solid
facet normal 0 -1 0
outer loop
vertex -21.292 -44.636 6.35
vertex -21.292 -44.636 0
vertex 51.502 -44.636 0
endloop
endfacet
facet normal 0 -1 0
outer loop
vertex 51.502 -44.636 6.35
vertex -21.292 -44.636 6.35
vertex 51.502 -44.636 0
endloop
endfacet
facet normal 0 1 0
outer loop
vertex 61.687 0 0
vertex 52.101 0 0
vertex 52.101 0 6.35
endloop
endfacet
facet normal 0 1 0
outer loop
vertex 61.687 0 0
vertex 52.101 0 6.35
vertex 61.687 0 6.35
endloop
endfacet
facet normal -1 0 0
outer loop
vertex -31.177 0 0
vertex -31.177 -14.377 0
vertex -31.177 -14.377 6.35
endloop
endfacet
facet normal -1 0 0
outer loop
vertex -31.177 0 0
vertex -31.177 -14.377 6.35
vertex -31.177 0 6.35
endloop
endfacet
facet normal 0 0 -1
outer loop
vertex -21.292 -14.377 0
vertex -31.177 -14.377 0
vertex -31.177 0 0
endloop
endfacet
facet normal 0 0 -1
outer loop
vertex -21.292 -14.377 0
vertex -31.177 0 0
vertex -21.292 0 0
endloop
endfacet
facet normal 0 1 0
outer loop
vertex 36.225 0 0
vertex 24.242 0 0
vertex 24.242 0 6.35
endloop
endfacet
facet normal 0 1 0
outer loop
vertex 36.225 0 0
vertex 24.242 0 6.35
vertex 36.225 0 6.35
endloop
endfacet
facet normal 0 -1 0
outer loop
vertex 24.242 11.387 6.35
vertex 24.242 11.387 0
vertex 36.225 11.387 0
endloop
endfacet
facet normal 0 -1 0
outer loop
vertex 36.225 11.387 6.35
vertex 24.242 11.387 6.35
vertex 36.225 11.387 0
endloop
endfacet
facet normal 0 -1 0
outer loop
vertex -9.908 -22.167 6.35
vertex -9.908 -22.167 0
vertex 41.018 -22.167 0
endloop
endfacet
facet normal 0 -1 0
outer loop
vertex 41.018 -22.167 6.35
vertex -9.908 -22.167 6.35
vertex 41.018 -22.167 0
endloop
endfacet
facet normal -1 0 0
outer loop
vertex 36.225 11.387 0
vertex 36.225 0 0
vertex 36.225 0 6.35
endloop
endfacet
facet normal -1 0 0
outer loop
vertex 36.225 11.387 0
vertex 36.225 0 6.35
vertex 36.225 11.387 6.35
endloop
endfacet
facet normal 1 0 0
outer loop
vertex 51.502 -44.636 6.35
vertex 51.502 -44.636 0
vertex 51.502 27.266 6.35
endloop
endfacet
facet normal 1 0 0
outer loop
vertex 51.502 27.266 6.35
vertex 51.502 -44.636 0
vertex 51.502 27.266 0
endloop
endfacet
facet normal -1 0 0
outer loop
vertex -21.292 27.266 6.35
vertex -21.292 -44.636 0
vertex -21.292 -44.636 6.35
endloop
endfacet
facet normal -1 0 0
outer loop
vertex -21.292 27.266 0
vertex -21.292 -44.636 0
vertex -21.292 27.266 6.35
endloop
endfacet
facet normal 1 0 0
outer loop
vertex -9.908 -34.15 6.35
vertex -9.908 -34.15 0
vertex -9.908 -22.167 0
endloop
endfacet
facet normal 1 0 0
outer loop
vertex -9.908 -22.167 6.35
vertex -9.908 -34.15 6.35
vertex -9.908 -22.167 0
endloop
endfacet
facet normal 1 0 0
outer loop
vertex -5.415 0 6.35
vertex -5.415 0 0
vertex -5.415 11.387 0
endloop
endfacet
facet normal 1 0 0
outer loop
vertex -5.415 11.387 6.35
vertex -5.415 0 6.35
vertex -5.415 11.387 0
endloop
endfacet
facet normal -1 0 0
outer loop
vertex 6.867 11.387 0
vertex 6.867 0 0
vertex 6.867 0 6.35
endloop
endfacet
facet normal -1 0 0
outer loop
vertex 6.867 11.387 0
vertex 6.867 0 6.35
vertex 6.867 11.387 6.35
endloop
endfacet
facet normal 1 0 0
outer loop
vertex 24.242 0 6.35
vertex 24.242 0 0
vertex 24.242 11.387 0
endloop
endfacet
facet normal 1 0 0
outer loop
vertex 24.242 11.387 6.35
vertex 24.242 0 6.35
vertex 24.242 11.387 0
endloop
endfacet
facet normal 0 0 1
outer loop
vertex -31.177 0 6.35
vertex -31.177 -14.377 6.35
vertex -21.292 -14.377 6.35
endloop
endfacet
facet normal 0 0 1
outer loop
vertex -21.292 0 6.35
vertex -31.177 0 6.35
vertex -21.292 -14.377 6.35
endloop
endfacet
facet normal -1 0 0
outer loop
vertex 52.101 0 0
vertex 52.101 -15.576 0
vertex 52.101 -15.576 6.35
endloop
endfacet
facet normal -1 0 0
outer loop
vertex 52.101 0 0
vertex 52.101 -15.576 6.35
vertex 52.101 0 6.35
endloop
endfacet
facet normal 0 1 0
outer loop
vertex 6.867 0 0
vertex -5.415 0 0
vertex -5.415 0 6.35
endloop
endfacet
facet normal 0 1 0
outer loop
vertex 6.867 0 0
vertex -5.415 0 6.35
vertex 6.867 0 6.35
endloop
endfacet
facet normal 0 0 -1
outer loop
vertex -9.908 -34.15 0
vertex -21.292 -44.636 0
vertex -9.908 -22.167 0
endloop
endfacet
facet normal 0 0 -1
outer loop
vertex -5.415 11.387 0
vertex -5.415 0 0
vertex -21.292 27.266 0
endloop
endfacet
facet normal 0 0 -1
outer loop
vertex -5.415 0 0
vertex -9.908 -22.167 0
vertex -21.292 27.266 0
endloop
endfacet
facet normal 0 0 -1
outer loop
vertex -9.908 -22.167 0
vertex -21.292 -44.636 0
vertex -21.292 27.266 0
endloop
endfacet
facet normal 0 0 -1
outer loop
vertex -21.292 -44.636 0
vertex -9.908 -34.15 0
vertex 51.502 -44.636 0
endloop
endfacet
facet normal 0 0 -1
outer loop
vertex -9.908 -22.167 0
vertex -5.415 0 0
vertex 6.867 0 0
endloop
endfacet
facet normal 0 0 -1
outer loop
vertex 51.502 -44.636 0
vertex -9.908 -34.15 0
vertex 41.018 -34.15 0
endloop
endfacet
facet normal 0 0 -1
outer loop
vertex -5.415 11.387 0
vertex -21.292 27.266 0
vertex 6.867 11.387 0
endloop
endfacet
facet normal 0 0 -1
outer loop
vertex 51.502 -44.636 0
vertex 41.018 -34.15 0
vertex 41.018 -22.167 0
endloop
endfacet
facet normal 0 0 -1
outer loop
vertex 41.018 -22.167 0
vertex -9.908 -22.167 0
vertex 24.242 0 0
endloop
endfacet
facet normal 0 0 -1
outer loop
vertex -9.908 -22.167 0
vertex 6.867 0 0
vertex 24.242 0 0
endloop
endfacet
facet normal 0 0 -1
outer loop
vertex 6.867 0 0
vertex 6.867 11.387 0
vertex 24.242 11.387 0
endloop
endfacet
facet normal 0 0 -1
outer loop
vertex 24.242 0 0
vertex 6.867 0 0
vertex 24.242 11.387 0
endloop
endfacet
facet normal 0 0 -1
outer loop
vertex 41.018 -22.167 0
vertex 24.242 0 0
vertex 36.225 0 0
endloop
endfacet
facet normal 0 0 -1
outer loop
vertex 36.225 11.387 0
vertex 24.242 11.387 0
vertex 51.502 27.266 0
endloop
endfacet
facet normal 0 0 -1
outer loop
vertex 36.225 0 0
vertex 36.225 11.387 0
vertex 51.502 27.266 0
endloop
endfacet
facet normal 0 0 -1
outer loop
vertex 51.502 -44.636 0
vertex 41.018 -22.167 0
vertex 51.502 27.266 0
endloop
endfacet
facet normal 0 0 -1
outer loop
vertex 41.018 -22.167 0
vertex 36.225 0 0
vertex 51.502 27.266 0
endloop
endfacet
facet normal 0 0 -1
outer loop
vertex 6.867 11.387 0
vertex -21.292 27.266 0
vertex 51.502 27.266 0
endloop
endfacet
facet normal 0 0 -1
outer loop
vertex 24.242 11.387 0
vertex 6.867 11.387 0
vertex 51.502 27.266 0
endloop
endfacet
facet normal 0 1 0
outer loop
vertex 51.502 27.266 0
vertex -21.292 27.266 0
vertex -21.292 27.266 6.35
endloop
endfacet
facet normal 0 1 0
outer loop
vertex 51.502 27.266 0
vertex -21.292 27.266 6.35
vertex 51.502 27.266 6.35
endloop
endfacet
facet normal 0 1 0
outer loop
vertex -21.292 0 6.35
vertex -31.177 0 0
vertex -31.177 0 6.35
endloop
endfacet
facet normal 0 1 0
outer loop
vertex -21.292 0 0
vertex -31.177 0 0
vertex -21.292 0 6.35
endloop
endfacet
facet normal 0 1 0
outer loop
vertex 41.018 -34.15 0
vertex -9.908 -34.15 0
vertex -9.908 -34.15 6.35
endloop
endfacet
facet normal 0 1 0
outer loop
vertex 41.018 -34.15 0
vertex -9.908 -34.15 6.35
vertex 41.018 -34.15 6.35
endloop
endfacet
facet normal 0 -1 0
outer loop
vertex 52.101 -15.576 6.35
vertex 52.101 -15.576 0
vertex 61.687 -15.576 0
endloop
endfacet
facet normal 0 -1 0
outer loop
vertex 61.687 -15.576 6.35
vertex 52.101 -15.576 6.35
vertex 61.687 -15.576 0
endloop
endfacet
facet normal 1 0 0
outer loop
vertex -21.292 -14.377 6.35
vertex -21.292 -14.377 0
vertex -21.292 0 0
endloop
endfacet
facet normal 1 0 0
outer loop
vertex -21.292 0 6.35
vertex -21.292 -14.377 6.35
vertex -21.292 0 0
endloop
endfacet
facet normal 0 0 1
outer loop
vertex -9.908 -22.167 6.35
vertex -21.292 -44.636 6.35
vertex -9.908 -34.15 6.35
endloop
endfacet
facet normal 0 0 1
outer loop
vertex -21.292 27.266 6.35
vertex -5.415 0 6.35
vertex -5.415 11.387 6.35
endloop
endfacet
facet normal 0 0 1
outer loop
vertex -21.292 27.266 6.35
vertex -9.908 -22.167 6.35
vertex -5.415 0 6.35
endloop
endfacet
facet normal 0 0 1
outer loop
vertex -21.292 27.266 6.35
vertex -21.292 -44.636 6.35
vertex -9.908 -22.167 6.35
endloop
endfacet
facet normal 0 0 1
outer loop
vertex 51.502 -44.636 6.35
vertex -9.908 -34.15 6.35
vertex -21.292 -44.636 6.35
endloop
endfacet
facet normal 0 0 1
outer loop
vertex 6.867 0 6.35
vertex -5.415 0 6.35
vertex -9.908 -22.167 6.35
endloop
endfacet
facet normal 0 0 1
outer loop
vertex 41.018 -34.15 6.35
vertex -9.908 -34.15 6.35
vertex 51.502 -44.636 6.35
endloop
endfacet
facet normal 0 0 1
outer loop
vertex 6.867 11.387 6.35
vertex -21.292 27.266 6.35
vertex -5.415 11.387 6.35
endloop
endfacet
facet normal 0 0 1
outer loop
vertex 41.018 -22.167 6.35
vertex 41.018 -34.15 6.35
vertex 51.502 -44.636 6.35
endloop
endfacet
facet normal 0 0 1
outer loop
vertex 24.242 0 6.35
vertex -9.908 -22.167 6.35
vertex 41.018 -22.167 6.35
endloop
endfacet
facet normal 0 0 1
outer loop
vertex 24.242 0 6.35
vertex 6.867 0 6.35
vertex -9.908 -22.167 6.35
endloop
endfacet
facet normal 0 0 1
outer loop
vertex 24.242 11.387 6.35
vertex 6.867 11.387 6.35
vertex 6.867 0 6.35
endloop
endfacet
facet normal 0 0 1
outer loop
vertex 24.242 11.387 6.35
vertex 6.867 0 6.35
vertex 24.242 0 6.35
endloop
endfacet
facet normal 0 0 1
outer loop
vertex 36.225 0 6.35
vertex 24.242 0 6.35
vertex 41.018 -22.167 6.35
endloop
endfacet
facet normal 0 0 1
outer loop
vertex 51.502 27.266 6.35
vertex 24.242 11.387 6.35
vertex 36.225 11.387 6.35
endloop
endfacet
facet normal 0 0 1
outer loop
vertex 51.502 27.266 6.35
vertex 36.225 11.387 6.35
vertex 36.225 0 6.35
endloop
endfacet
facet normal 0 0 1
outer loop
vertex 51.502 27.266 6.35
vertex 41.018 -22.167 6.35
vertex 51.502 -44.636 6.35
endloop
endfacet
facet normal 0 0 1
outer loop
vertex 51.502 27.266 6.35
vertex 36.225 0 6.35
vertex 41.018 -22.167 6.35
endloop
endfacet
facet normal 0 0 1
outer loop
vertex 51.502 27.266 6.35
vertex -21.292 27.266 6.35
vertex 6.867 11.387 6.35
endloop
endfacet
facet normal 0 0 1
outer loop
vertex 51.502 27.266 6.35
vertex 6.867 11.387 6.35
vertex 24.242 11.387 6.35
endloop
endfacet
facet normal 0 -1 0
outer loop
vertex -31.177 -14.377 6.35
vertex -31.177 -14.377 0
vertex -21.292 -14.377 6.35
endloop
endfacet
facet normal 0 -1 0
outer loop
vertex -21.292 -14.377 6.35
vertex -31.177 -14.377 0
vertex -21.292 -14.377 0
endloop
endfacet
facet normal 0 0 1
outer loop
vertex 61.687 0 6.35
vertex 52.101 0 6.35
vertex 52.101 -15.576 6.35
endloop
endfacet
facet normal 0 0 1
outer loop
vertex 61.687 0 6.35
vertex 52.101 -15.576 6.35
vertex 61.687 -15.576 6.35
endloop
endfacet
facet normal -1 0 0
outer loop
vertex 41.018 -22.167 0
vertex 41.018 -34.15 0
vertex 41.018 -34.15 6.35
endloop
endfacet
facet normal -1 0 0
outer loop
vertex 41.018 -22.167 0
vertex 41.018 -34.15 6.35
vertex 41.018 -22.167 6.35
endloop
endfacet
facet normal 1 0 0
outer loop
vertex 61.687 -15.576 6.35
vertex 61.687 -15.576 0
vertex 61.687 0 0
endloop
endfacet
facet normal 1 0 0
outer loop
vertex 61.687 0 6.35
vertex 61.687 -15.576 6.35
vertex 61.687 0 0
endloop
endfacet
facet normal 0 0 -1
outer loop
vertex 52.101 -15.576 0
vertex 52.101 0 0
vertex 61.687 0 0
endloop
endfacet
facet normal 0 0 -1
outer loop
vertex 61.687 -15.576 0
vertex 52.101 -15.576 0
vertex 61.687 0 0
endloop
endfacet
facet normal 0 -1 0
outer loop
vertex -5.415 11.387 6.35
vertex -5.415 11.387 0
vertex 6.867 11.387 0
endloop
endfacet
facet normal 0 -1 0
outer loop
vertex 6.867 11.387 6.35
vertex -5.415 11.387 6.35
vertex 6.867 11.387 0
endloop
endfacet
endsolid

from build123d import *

# Parameters (mm, degrees)
F0_W     = 72.793982923
F0_H     = 71.901589632
F5_DEPTH = 6.35
F1_W     = 9.5860436559
F1_H     = 15.57565853
F2_W     = 9.8856016994
F2_H     = 14.3773043528
F3_W     = 12.282113079
F3_H     = 11.3873127848
F3_W_2   = 11.9825508446
F6_DEPTH = 25.4
F7_DEPTH = 6.35
F8_DEPTH = 25.4
F4_W     = 50.9258313105
F4_H     = 11.9835436344
F9_DEPTH = 25.4


with BuildPart() as f5:
    # F0 (on Top) → F5 (new body)
    with BuildSketch(Plane.XY):
        with Locations((15.1053145528, -8.6849555373)):
            Rectangle(F0_W, F0_H)
    extrude(amount=F5_DEPTH)

    # F3 (on Top) → F6 (cut)
    with BuildSketch(Plane.XY):
        with Locations((0.7262567524, 5.6936563924)):
            Rectangle(F3_W, F3_H)
        with Locations((30.2332835272, 5.6936563924)):
            Rectangle(F3_W_2, F3_H)
    extrude(amount=-F6_DEPTH, mode=Mode.SUBTRACT)

    # F3 (on Top) → F7 (join)
    with BuildSketch(Plane.XY):
        with Locations((30.2332835272, 5.6936563924)):
            Rectangle(F3_W_2, F3_H)
        with Locations((0.7262567524, 5.6936563924)):
            Rectangle(F3_W, F3_H)
    extrude(amount=F7_DEPTH)

    # F3 (on Top) → F8 (cut)
    with BuildSketch(Plane.XY):
        with Locations((30.2332835272, 5.6936563924)):
            Rectangle(F3_W_2, F3_H)
        with Locations((0.7262567524, 5.6936563924)):
            Rectangle(F3_W, F3_H)
    extrude(amount=F8_DEPTH, mode=Mode.SUBTRACT)

    # F4 (on Top) → F9 (cut)
    with BuildSketch(Plane.XY):
        with Locations((15.5546613969, -28.158377856)):
            Rectangle(F4_W, F4_H)
    extrude(amount=F9_DEPTH, mode=Mode.SUBTRACT)


with BuildPart() as f5b:
    # F1 (on Top) → F5, piece 2 (new body)
    with BuildSketch(Plane.XY):
        with Locations((56.8944551051, -7.787829265)):
            Rectangle(F1_W, F1_H)
    extrude(amount=F5_DEPTH)


with BuildPart() as f5c:
    # F2 (on Top) → F5, piece 3 (new body)
    with BuildSketch(Plane.XY):
        with Locations((-26.2344777584, -7.1886521764)):
            Rectangle(F2_W, F2_H)
    extrude(amount=F5_DEPTH)


solid = Compound([f5.part, f5b.part, f5c.part])
